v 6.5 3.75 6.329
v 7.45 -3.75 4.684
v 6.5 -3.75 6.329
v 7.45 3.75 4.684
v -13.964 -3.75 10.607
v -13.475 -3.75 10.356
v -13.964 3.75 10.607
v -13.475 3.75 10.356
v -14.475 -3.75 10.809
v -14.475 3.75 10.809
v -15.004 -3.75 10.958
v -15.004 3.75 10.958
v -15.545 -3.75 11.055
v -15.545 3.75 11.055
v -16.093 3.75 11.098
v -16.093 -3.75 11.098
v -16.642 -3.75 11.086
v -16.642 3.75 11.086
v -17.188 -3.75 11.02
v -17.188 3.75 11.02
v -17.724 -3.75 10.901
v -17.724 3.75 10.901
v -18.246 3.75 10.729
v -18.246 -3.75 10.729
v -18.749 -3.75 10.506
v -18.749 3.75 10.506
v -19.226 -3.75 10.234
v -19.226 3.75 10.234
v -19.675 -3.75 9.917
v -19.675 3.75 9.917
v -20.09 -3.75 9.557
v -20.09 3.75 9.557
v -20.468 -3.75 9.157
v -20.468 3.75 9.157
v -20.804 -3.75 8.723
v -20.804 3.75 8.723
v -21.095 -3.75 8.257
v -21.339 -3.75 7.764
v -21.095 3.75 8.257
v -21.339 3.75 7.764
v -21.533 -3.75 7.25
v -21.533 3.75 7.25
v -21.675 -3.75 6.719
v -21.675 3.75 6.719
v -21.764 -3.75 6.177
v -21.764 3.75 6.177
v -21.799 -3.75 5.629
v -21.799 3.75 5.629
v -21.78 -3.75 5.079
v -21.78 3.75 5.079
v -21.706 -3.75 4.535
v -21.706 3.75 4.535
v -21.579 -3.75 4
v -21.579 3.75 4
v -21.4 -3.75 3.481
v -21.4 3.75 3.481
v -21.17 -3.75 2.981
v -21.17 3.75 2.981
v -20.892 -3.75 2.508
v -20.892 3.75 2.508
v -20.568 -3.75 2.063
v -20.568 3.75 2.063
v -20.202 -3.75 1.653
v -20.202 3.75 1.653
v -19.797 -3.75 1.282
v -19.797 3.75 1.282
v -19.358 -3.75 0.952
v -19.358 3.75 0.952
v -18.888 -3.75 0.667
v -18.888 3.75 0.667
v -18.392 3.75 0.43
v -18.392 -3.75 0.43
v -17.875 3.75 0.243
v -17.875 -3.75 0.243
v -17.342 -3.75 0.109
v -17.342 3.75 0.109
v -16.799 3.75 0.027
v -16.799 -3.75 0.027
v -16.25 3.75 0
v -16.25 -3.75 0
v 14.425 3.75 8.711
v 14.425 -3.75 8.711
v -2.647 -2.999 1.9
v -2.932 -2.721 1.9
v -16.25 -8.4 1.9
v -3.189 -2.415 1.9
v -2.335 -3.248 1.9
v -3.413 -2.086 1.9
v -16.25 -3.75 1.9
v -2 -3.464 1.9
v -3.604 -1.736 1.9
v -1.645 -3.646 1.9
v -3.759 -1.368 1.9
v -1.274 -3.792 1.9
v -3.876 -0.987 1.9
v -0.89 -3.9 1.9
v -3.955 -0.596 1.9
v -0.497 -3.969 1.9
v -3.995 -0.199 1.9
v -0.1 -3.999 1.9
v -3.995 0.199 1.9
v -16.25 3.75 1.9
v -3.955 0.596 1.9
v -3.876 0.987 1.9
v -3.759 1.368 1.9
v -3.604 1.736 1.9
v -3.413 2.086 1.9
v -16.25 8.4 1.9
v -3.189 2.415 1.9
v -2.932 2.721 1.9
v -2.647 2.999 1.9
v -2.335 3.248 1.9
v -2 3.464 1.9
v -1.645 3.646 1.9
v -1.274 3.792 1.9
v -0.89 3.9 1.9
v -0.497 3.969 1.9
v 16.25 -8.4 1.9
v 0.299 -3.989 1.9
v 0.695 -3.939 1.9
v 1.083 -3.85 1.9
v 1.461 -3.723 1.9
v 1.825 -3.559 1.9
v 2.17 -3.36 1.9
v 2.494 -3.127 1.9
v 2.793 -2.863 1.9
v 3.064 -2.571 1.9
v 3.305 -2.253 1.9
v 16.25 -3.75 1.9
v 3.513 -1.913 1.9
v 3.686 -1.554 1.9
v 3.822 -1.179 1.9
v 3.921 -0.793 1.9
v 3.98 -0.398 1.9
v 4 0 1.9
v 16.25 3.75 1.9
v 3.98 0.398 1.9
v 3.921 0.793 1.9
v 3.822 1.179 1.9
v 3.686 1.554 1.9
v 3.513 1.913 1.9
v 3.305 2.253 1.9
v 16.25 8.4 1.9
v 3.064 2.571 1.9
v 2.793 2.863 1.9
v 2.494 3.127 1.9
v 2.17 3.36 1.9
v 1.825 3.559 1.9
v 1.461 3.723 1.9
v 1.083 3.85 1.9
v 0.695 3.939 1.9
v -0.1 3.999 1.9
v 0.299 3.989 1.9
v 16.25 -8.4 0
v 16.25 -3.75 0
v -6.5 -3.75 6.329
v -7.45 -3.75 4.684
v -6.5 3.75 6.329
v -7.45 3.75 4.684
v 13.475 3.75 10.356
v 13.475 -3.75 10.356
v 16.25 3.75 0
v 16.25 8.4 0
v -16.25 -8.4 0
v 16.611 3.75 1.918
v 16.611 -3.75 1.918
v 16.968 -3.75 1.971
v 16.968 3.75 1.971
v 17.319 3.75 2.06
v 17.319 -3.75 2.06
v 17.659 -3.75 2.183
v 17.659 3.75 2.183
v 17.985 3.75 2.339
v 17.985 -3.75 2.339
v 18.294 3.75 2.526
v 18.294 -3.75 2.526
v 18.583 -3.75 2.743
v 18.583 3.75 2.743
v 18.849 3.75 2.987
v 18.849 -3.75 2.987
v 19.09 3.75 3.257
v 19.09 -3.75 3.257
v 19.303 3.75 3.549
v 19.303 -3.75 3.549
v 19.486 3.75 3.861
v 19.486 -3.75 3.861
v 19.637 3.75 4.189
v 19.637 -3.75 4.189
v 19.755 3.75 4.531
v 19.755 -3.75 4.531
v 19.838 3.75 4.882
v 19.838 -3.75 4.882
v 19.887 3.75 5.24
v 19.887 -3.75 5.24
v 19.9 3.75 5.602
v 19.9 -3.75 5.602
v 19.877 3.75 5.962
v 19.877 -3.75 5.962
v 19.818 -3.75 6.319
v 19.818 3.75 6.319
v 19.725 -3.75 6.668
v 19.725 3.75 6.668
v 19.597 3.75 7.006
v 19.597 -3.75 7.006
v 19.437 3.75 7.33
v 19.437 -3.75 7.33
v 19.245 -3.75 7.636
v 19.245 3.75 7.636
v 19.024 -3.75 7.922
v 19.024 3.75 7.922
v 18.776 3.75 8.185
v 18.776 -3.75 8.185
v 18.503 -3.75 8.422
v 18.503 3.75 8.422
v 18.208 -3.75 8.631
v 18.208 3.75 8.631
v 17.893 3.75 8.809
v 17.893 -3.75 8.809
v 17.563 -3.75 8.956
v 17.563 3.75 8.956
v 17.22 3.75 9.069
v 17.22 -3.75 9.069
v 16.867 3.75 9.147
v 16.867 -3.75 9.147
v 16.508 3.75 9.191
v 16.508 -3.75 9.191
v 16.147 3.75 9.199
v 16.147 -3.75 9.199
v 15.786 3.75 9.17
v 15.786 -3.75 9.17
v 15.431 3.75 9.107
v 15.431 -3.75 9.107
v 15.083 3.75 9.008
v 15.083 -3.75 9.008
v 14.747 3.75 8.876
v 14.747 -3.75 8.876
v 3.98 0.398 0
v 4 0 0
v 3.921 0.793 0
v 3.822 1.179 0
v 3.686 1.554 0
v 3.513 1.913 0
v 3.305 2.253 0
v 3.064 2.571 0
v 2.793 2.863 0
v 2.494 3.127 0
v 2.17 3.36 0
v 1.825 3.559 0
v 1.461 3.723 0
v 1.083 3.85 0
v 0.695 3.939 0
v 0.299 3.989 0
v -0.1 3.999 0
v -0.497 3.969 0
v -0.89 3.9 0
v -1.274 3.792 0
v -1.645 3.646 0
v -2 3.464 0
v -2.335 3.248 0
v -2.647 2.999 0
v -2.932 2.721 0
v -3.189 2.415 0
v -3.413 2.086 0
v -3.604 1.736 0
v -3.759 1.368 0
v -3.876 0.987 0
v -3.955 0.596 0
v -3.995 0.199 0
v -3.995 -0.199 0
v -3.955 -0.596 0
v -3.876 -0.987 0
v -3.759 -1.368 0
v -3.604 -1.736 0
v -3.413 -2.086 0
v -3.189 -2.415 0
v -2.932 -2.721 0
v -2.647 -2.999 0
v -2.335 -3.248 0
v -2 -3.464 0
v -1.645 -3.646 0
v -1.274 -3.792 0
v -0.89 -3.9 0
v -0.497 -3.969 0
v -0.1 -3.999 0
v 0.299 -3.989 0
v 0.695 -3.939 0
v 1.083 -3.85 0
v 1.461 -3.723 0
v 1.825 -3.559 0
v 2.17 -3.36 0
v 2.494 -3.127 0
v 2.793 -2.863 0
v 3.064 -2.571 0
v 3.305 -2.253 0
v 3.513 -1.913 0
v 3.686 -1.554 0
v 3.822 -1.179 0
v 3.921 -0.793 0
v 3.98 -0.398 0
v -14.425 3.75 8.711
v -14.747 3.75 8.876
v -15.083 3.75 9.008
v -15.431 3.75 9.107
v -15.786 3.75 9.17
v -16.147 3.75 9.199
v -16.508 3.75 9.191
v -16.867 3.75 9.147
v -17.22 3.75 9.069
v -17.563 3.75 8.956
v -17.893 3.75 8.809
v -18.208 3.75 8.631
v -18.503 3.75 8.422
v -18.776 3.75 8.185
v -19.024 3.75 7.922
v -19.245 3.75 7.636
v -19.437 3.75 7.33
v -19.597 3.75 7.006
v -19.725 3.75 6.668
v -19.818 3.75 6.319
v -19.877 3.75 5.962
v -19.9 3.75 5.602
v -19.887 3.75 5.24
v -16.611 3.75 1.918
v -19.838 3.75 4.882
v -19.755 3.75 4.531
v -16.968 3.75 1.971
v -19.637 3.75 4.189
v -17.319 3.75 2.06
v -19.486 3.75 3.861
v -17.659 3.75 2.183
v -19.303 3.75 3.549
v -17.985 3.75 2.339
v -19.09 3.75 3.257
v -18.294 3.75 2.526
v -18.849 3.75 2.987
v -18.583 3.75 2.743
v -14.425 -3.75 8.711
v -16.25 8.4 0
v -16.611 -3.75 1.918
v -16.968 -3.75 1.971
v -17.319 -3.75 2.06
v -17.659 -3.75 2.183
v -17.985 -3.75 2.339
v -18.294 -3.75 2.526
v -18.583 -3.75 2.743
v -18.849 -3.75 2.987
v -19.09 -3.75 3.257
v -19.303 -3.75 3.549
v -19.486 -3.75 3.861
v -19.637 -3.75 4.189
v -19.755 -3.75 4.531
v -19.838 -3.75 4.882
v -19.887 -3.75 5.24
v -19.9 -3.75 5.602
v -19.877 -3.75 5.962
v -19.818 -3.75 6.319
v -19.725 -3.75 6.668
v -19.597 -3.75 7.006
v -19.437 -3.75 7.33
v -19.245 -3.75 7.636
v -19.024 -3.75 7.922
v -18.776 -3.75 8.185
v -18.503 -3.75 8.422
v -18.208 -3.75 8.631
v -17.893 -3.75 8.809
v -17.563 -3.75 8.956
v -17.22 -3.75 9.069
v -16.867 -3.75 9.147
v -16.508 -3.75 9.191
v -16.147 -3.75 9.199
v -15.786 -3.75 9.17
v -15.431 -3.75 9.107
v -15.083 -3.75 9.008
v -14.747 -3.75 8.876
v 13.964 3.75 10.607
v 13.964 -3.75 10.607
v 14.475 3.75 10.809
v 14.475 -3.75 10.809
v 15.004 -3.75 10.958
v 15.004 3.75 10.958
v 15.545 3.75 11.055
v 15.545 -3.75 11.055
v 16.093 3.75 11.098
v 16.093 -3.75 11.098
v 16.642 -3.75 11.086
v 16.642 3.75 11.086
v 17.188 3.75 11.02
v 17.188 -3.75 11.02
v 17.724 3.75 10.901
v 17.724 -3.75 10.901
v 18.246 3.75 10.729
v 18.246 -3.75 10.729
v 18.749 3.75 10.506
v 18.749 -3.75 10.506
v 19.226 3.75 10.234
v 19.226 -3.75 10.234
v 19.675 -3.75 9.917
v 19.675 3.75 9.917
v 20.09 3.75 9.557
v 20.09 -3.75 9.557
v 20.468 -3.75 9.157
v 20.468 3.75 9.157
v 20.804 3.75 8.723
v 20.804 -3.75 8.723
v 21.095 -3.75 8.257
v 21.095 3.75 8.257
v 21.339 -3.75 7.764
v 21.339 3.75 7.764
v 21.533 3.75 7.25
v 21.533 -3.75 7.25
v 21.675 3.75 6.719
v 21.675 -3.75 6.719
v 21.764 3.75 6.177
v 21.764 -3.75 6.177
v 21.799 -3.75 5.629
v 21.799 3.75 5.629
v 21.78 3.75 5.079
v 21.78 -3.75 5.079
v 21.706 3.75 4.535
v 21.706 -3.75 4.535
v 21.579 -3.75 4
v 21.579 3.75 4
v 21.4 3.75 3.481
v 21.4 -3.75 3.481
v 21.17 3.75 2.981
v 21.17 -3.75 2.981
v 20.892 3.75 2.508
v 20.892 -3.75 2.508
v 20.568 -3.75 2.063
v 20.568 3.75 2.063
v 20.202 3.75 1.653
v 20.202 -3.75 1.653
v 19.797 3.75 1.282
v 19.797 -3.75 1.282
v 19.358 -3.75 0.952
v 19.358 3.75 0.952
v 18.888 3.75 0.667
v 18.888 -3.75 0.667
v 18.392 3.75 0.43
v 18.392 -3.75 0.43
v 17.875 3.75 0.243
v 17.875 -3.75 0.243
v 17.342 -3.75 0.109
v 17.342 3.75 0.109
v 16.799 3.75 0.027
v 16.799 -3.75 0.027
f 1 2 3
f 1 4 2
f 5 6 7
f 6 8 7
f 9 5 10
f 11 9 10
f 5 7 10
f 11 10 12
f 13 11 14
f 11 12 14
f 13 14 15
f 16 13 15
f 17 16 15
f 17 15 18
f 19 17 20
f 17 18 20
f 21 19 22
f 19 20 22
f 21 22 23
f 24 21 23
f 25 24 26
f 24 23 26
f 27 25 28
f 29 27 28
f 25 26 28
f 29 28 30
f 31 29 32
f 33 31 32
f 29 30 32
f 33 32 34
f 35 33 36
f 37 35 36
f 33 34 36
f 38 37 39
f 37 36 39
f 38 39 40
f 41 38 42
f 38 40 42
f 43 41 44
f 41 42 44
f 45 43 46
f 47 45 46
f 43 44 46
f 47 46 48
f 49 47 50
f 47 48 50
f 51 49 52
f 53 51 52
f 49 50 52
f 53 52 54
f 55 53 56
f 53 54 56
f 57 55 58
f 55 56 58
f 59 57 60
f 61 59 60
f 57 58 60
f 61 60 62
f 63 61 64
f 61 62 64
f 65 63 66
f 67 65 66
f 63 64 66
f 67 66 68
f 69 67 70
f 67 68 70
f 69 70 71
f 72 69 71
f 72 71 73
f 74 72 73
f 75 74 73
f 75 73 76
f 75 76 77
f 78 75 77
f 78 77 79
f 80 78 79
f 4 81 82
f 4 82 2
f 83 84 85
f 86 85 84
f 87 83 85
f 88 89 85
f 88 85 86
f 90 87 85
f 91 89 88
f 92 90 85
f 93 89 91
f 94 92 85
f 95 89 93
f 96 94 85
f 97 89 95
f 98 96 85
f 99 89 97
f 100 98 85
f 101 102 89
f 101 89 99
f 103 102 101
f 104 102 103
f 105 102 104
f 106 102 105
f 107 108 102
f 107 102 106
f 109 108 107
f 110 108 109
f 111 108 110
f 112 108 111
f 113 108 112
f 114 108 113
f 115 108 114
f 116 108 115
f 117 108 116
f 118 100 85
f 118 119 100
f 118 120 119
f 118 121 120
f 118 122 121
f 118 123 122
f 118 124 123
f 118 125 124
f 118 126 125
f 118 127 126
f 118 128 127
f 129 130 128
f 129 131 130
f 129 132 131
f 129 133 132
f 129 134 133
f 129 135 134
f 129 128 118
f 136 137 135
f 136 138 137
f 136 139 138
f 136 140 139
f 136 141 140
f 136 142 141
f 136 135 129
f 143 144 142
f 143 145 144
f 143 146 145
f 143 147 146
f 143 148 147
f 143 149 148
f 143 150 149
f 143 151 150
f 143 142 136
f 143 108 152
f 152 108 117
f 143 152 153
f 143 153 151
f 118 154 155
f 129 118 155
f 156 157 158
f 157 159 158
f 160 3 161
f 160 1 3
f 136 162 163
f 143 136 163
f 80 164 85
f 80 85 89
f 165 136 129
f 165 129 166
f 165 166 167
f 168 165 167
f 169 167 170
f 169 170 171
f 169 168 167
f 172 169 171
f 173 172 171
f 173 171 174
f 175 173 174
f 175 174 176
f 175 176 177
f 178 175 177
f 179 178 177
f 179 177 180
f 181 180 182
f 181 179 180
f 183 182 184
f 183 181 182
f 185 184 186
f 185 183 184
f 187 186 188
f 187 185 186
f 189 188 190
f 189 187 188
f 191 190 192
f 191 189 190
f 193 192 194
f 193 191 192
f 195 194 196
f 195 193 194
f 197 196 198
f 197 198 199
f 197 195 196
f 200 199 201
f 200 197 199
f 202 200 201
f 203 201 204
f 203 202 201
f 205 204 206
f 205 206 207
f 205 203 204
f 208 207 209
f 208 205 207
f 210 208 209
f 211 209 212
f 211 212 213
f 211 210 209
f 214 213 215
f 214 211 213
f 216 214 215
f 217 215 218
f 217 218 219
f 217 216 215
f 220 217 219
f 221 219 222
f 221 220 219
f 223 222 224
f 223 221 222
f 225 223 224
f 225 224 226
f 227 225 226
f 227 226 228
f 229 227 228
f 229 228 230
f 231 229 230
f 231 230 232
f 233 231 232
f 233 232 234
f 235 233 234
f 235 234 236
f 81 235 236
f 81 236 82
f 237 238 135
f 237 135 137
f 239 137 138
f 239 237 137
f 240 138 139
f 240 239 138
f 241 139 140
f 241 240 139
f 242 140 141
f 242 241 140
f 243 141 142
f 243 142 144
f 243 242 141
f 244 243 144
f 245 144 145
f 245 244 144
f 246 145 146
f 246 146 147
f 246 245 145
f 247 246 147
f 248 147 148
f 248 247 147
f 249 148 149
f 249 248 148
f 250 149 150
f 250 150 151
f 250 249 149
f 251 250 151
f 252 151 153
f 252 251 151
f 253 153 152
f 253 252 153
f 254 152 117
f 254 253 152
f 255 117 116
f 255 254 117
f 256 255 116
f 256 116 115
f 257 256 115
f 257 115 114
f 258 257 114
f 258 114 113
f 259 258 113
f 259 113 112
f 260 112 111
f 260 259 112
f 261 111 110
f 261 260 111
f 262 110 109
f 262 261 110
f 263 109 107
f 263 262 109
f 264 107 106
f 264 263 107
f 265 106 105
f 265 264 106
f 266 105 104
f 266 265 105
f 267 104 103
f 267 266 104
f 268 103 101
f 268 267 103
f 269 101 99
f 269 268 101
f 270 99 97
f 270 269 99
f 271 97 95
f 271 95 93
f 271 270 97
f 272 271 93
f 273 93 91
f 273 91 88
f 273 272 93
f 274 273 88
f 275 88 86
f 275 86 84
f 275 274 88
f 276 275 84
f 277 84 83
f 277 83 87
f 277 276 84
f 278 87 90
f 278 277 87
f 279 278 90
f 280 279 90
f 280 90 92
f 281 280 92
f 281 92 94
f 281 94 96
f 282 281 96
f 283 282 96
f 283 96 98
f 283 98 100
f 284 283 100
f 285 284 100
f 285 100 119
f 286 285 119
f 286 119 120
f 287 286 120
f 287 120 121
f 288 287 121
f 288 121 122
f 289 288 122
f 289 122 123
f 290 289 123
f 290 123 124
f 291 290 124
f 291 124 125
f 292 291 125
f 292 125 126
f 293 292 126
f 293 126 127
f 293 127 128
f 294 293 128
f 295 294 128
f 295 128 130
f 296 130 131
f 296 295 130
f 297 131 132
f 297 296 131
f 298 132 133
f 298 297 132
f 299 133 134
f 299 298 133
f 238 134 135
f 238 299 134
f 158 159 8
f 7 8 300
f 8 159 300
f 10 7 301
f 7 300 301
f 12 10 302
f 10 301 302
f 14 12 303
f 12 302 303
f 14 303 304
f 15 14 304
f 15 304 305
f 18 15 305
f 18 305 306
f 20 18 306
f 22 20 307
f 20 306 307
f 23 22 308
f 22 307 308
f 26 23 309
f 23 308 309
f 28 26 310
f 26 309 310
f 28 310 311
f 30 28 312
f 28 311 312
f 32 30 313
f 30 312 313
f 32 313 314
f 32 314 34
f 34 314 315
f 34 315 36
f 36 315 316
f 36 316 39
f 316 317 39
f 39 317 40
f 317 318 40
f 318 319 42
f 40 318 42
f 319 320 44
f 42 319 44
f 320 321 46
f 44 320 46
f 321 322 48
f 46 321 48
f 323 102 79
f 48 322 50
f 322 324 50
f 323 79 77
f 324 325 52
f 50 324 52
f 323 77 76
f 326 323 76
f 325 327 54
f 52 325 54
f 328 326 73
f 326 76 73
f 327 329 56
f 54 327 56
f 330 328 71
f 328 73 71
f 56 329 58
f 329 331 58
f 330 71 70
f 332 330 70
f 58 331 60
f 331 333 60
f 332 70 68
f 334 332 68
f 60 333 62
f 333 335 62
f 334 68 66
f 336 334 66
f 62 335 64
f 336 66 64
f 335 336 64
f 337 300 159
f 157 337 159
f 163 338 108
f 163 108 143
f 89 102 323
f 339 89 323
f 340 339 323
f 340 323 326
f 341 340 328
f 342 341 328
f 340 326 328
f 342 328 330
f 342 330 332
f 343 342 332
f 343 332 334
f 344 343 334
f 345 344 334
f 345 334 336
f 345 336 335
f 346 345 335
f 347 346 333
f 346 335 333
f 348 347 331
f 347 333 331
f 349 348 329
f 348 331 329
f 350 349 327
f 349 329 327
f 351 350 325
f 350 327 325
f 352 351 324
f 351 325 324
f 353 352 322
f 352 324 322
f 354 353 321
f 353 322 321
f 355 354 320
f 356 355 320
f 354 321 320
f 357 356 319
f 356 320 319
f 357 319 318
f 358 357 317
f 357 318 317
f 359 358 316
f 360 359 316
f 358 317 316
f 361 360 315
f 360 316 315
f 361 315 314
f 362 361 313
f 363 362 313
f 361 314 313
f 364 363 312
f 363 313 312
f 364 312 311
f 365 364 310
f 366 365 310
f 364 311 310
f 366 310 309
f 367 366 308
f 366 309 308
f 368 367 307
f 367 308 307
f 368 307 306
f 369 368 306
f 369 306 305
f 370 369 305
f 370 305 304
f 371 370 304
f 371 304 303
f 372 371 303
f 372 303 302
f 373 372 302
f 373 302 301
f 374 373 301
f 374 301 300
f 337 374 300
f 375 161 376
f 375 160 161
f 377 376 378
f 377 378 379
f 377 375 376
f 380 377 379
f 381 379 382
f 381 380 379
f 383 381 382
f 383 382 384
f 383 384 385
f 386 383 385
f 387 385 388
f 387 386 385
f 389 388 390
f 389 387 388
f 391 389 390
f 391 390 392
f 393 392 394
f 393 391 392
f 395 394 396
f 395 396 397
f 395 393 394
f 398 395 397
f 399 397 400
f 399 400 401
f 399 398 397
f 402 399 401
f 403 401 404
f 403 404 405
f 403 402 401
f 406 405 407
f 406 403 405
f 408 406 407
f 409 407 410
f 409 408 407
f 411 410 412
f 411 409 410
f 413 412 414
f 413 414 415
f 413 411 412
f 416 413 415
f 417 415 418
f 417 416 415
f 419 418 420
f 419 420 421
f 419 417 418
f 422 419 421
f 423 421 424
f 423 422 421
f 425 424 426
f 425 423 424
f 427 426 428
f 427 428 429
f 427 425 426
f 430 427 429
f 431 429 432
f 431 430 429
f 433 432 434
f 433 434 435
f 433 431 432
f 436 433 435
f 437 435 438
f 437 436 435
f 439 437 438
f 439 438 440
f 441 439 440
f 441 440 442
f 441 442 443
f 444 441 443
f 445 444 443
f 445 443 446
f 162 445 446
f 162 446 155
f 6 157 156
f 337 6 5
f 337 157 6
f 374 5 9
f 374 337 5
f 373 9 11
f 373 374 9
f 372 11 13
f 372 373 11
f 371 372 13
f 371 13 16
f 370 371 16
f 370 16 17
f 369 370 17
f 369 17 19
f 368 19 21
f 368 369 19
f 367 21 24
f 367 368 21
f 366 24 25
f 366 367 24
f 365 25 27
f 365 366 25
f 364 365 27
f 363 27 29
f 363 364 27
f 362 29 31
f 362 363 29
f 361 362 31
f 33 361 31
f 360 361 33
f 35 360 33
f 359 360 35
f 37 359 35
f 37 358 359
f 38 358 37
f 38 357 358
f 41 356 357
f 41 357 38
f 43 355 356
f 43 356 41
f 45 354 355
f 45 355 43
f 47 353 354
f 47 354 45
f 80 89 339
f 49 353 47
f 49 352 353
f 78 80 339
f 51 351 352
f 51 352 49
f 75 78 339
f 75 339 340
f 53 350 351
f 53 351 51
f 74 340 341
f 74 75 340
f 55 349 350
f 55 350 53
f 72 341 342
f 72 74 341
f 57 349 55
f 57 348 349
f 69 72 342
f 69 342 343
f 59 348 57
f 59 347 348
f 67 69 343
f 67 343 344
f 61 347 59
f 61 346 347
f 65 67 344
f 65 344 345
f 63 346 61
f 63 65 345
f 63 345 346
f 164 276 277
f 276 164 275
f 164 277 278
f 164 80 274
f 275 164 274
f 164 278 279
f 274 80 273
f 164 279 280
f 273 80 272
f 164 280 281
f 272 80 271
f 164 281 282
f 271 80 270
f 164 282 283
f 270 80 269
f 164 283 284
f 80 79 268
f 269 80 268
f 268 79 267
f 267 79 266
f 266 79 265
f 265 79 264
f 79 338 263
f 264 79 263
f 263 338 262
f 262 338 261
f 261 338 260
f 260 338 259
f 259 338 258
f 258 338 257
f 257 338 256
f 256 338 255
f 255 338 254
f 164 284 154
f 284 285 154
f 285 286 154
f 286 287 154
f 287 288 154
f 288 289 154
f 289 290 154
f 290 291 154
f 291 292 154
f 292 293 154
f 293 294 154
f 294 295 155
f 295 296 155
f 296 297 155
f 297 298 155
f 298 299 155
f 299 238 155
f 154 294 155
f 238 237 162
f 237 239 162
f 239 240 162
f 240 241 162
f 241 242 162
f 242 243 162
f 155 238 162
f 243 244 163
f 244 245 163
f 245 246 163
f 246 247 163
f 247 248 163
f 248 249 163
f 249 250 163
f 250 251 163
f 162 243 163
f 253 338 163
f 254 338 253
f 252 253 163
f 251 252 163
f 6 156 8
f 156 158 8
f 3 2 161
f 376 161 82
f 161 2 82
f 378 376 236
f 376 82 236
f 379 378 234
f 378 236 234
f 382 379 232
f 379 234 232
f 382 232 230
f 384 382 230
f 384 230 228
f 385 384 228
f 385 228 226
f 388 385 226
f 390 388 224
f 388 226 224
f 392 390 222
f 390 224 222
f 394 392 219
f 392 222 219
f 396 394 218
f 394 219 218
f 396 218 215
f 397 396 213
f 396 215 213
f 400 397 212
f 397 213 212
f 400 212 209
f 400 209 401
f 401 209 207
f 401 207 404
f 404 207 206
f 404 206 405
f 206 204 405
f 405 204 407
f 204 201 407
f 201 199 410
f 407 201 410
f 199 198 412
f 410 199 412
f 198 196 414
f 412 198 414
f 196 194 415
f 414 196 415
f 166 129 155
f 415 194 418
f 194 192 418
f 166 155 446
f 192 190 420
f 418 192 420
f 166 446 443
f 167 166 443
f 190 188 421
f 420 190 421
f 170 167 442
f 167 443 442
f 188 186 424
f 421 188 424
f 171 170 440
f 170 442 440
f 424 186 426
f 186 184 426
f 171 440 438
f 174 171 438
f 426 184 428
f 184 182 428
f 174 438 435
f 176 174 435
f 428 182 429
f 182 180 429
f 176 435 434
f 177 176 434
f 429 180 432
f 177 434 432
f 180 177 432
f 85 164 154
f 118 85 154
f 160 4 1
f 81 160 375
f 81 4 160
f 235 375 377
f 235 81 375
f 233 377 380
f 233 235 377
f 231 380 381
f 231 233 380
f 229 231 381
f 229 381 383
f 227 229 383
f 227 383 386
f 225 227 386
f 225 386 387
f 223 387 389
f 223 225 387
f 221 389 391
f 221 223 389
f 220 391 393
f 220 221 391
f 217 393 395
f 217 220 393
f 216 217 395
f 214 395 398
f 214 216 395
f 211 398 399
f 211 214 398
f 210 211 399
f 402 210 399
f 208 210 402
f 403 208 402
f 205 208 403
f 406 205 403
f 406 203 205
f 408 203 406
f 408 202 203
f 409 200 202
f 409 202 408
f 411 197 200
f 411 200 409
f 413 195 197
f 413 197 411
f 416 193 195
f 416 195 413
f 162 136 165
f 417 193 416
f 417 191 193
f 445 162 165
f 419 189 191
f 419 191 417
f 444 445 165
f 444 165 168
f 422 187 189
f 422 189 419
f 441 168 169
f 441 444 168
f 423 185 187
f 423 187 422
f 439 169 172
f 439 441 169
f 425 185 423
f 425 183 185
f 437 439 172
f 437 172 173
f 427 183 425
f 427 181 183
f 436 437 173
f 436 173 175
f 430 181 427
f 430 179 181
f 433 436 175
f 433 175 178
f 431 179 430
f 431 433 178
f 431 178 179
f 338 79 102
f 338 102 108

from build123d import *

# Parameters (mm, degrees)
SKETCH_1_W      = 32.5
SKETCH_1_H      = 16.8
SKETCH_1_R      = 4
EXTRUDE_1_DEPTH = 1.9
EXTRUDE_2_DEPTH = 3.75


with BuildPart() as part:
    # Эскиз1 → Бобышка-Вытянуть1 (new body)
    with BuildSketch(Plane.XY):
        Rectangle(SKETCH_1_W, SKETCH_1_H)
        Circle(SKETCH_1_R, mode=Mode.SUBTRACT)
    extrude(amount=EXTRUDE_1_DEPTH)

    # Эскиз3 → Бобышка-Вытянуть2 (add, symmetric)
    with BuildSketch(Plane(origin=(0, 0, 0), x_dir=(1, 0, 0), z_dir=(0, 1, 0))):
        with BuildLine():
            Line((-14.425, -8.710992724), (-7.45, -4.683974596))
            Line((-7.45, -4.683974596), (-6.5, -6.329422863))
            Line((-6.5, -6.329422863), (-13.475, -10.356440991))
            ThreePointArc((-13.475, -10.356440991), (-21.610888336, -6.9864457), (-16.25, 0))
            Line((-16.25, 0), (-16.25, -1.9))
            ThreePointArc((-16.25, -1.9), (-19.775629266, -6.494689515), (-14.425, -8.710992724))
        make_face()
    extrude_2 = extrude(amount=EXTRUDE_2_DEPTH, both=True)

    # Зеркальное отражение1: Бобышка-Вытянуть2 across plane
    add(extrude_2.mirror(Plane(origin=(0, 0, 0), x_dir=(0, 0, 1), z_dir=(1, 0, 0))))


solid = part.part
